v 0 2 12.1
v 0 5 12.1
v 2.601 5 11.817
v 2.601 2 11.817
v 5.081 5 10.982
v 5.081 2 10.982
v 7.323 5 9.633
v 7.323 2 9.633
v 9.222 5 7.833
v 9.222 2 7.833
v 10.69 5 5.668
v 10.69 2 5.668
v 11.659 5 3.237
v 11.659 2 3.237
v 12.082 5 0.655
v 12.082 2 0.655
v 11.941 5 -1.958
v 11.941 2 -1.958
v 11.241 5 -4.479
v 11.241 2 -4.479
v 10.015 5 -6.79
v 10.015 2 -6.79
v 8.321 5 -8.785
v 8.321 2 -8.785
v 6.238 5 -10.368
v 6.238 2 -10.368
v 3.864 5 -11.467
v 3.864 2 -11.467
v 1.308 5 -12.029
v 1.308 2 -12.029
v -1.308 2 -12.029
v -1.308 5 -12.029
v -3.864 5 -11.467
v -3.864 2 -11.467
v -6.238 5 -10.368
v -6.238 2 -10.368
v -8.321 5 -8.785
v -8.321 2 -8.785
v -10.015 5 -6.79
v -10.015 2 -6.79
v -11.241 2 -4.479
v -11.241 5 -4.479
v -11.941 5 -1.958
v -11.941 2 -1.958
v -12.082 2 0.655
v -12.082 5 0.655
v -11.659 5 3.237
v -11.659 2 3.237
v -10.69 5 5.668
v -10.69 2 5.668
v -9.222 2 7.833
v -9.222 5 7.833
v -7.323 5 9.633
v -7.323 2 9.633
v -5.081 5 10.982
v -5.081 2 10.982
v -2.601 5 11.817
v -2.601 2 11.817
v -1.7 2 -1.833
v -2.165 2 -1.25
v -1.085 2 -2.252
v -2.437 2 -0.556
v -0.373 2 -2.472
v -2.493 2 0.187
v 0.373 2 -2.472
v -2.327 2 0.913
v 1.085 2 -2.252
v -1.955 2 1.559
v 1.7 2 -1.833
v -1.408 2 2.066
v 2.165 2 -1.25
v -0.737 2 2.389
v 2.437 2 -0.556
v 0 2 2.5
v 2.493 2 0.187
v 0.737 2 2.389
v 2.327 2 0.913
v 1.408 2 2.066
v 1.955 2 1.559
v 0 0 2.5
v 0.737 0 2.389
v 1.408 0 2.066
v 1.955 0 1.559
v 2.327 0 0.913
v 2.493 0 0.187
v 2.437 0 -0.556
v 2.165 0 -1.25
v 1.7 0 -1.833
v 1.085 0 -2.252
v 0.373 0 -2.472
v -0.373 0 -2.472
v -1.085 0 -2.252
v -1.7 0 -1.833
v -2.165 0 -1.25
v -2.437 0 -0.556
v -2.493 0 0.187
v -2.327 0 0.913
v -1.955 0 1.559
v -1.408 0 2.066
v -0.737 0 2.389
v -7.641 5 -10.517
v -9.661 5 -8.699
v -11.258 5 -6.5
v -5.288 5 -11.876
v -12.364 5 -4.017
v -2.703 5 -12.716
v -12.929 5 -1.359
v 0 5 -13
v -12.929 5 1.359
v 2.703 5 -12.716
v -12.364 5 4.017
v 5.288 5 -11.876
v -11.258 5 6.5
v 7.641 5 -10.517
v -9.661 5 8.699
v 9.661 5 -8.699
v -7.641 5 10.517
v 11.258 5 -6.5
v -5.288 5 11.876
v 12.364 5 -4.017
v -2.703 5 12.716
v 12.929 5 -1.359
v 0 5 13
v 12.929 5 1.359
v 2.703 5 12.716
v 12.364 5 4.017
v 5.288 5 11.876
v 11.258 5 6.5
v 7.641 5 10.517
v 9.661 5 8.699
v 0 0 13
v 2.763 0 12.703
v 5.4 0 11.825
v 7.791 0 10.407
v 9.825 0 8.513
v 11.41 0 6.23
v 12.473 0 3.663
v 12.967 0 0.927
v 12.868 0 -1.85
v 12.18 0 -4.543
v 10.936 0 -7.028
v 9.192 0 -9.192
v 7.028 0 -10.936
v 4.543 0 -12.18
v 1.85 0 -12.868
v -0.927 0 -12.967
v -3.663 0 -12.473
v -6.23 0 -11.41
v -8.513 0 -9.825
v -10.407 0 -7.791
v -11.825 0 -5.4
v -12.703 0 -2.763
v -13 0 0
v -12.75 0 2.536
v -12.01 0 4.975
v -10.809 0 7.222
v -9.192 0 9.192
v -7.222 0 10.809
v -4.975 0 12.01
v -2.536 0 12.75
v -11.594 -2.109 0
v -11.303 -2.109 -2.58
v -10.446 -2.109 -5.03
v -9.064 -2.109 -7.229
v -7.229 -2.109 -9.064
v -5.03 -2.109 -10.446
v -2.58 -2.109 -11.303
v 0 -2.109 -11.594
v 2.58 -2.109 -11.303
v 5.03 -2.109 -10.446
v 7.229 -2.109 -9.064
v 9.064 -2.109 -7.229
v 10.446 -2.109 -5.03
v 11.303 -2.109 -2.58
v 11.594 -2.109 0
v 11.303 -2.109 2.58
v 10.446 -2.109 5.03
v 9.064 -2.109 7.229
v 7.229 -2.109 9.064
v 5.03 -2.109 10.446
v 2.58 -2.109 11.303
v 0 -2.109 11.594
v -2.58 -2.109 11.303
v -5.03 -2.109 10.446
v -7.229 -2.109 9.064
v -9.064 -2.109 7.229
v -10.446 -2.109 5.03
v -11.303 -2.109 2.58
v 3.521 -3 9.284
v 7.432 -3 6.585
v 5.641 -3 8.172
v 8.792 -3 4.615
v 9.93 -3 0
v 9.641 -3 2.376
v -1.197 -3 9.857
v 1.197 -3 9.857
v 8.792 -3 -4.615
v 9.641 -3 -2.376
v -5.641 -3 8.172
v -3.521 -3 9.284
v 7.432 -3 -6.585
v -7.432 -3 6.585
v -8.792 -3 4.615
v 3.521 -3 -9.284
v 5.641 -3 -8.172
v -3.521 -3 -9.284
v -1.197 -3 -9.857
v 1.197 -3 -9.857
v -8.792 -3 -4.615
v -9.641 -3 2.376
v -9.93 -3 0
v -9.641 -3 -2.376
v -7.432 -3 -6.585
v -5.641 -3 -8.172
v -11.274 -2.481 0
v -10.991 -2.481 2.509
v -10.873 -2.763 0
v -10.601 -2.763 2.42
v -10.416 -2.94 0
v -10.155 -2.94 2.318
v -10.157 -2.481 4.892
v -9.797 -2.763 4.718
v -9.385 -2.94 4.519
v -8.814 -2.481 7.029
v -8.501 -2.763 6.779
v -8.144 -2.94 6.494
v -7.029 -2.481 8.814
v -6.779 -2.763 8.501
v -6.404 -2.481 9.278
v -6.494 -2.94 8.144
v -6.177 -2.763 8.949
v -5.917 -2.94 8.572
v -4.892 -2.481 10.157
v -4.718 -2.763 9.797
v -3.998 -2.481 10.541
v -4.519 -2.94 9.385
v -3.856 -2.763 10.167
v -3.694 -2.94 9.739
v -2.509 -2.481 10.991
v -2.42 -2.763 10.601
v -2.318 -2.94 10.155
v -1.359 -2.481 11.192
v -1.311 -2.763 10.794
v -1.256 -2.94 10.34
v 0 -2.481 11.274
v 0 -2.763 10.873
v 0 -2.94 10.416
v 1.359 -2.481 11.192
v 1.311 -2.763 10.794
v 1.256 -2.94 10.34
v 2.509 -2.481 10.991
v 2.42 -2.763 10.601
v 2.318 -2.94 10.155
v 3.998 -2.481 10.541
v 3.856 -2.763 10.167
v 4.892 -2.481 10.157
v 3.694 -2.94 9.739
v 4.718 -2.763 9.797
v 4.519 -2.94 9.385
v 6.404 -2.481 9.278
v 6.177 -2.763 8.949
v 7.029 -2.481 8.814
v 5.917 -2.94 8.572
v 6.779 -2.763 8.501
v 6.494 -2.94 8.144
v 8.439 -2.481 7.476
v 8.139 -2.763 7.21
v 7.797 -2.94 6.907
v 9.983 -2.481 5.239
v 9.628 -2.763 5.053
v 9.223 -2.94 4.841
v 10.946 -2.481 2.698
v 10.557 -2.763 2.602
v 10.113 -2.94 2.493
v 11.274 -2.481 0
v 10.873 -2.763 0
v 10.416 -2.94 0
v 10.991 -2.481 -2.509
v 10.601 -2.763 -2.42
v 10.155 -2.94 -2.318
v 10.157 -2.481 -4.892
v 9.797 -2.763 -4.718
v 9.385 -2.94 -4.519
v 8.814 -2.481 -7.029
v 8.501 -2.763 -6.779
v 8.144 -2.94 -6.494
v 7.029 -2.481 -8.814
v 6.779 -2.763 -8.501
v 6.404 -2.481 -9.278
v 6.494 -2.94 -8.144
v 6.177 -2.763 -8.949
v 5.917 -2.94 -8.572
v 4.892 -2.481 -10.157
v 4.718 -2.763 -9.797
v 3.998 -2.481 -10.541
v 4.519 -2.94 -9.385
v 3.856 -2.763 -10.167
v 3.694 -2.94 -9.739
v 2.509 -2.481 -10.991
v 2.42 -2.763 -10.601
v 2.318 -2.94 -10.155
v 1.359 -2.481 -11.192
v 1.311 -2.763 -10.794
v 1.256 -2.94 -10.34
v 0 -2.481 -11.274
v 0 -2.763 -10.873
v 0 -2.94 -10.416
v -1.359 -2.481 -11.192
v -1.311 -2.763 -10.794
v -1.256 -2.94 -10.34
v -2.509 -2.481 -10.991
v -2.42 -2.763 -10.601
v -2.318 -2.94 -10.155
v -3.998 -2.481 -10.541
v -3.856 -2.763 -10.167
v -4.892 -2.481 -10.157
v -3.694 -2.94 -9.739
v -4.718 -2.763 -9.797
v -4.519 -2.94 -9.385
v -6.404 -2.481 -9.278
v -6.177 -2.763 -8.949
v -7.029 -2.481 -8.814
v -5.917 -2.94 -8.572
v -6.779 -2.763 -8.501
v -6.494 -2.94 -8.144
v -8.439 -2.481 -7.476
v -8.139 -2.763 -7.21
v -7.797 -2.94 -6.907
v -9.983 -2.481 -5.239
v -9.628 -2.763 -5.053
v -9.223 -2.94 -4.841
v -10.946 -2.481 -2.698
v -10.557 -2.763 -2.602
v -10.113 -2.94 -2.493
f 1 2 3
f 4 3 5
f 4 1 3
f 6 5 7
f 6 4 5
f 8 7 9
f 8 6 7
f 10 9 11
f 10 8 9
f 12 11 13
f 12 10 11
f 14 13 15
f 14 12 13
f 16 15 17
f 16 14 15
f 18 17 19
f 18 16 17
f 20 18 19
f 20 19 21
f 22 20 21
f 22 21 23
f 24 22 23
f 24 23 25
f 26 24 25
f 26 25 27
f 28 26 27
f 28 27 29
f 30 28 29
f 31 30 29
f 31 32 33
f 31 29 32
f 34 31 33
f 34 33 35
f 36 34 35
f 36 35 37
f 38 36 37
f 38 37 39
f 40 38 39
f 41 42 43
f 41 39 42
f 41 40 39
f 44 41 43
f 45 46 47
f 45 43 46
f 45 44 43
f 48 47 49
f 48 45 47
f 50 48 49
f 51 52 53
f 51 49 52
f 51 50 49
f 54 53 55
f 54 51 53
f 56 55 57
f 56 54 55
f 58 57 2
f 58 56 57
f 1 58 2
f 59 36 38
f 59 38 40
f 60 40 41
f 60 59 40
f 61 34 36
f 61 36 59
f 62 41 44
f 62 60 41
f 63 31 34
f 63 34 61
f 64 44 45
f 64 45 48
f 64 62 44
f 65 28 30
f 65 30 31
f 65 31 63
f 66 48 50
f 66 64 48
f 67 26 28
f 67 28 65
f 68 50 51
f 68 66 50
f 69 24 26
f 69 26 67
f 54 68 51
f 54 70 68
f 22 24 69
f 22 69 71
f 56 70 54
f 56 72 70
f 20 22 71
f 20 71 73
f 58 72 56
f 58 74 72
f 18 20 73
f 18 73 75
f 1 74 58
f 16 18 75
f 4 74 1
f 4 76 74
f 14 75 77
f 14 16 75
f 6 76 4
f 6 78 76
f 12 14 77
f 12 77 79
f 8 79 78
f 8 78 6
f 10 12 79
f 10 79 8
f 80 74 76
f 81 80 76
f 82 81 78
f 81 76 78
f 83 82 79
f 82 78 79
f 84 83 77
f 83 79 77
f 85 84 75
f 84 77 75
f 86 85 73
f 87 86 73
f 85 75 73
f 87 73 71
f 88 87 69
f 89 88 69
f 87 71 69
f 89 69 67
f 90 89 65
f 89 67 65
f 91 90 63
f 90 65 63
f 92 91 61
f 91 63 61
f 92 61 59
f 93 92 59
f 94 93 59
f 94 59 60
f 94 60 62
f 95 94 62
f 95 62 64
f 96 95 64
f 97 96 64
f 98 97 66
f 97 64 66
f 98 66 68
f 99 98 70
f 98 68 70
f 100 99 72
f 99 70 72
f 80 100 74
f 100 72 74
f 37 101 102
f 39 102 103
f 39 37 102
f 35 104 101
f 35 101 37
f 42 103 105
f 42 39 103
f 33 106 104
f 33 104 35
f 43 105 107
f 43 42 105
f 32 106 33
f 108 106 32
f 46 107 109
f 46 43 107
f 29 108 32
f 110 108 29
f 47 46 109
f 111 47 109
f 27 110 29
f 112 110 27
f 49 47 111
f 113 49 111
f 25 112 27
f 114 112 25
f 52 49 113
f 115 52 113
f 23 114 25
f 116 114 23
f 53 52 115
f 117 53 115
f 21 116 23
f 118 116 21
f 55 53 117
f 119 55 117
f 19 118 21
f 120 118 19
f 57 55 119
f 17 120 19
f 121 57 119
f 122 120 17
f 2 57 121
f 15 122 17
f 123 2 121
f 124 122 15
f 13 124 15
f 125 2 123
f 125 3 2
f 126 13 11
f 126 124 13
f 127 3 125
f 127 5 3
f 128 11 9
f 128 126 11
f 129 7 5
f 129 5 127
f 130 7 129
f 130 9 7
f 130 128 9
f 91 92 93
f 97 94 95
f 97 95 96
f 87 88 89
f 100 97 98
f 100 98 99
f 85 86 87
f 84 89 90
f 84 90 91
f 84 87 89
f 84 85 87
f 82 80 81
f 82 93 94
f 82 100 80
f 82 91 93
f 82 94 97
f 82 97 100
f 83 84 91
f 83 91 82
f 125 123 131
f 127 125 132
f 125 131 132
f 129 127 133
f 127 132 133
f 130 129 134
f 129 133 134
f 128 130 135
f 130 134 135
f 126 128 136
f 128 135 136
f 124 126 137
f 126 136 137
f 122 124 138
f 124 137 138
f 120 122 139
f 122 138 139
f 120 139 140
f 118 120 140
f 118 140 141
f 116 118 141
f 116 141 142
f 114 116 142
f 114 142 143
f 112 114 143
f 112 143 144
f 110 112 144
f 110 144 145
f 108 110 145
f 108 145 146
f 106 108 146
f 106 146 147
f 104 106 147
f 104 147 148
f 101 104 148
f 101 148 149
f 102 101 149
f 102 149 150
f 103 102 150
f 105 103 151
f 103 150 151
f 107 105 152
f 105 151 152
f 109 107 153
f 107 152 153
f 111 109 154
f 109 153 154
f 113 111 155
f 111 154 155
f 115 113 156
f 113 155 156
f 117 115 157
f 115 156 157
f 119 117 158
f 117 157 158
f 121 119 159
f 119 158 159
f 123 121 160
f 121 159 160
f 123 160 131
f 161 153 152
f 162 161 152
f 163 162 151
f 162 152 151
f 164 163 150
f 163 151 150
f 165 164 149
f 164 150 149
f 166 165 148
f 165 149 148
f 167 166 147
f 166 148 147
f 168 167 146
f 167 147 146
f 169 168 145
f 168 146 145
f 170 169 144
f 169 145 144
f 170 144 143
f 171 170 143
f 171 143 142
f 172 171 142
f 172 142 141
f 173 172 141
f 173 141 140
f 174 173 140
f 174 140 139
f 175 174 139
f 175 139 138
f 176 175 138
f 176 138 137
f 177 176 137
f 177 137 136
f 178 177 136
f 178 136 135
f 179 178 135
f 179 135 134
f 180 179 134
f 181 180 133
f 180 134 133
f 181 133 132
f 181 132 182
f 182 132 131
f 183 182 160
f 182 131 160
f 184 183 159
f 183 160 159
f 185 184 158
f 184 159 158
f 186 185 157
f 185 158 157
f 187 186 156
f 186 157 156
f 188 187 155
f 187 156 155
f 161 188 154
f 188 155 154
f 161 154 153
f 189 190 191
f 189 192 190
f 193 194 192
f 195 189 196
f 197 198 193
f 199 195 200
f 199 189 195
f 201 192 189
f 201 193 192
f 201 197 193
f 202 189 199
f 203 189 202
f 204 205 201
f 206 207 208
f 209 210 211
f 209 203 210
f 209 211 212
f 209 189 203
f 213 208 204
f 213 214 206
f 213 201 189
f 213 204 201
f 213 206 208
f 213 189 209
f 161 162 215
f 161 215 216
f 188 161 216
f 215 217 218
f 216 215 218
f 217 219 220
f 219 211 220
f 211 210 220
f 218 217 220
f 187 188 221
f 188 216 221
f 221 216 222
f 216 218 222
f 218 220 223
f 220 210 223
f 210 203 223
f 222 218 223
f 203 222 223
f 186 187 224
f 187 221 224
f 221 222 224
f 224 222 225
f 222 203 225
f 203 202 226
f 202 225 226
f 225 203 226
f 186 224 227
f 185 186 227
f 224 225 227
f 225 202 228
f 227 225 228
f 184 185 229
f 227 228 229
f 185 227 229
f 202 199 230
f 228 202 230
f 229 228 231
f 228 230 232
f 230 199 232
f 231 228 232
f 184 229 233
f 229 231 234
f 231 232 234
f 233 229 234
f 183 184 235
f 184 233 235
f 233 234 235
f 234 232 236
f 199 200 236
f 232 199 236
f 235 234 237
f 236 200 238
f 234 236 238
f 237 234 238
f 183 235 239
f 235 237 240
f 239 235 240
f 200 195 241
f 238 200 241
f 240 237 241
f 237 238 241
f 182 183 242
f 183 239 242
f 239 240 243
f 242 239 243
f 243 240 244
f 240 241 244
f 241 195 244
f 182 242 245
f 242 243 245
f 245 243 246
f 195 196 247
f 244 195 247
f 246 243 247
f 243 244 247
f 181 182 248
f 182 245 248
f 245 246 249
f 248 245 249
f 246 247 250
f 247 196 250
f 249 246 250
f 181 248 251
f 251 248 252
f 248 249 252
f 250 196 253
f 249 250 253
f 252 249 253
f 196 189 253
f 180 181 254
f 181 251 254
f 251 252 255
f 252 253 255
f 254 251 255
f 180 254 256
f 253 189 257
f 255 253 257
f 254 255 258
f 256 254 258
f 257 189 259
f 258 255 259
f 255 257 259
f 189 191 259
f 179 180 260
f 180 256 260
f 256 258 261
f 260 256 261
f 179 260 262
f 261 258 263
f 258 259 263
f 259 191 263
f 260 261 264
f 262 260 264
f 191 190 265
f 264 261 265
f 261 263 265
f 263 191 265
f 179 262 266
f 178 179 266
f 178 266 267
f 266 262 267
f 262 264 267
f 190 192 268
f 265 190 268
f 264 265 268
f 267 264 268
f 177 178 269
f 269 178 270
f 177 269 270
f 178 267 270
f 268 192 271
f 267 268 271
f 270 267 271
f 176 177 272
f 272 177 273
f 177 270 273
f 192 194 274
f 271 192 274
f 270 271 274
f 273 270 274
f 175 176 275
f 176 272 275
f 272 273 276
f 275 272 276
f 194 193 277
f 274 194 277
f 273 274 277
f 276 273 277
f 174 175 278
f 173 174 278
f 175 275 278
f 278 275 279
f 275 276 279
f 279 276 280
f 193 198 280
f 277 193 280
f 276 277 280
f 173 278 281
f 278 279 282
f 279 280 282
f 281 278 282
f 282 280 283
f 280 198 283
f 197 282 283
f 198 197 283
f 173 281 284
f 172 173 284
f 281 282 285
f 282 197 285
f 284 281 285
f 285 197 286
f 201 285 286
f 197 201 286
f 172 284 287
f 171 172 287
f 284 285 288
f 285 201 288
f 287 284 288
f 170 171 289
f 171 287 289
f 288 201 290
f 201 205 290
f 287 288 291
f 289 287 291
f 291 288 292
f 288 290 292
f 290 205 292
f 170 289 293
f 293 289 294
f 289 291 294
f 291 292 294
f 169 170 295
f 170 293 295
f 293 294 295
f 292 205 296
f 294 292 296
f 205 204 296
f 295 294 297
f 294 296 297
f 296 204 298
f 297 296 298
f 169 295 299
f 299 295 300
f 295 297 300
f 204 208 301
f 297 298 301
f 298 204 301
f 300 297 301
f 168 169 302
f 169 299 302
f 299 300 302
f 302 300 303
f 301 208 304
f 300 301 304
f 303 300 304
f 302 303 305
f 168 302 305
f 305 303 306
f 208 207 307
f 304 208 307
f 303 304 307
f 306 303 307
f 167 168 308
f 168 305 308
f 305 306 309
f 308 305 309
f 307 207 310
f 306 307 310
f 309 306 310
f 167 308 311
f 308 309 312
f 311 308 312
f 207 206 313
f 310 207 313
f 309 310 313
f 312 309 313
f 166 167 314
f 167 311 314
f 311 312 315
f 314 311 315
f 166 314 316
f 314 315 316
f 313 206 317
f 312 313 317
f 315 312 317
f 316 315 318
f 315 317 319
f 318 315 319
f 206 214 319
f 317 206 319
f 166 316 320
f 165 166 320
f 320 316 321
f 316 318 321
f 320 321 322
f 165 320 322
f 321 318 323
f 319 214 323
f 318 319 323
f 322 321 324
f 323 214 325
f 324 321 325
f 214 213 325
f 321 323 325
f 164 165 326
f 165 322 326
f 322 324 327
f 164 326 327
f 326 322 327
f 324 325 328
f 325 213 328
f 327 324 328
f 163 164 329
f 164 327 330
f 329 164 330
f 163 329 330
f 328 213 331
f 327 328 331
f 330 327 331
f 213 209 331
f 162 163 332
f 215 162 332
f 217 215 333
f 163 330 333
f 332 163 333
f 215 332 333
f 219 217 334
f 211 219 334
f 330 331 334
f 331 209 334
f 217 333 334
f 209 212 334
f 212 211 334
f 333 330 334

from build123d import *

# Parameters (mm, degrees)
SKETCH_1_R          = 13
EXTRUDE_1_DEPTH     = 5
SKETCH_2_R          = 12
CUT_EXTRUDE_1_DEPTH = 3
SKETCH_3_R          = 2.5
CUT_EXTRUDE_2_DEPTH = 2
SKETCH_4_R          = 11
FILLET_1_R          = 2
SKETCH_7_R          = 12.1
CUT_EXTRUDE_3_DEPTH = 20.05255902


with BuildPart() as part:
    # 草图1 → 凸台-拉伸1 (new body)
    with BuildSketch(Plane(origin=(0, 0, 0), x_dir=(1, 0, 0), z_dir=(0, 1, 0))):
        with Locations(Location((0, 0, 0), (0, 0, 270))):
            Circle(SKETCH_1_R)
    extrude(amount=EXTRUDE_1_DEPTH)

    # 草图2 → 切除-拉伸1 (cut)
    with BuildSketch(Plane(origin=(0, 5, 0), x_dir=(1, 0, 0), z_dir=(0, 1, 0))):
        with Locations(Location((0, 0, 0), (0, 0, 270))):
            Circle(SKETCH_2_R)
    extrude(amount=-CUT_EXTRUDE_1_DEPTH, mode=Mode.SUBTRACT)

    # 草图3 → 切除-拉伸2 (cut)
    with BuildSketch(Plane(origin=(0, 2, 0), x_dir=(1, 0, 0), z_dir=(0, 1, 0))):
        with Locations(Location((0, 0, 0), (0, 0, 270))):
            Circle(SKETCH_3_R)
    extrude(amount=-CUT_EXTRUDE_2_DEPTH, mode=Mode.SUBTRACT)

    # 草图4 → section 0 of loft_1
    with BuildSketch(Plane(origin=(0, -3, 0), x_dir=(-1, 0, 0), z_dir=(0, -1, 0)), mode=Mode.PRIVATE) as loft_1_s0:
        Circle(SKETCH_4_R)
    # loft up to a face of the part (loft_1)
    loft([loft_1_s0.sketch, Face(Wire([part.edges().sort_by_distance((-9.476592156, 0, -8.899112377))[0]]))])

    # 圆角1
    fillet_1_edges = [part.edges().sort_by_distance(p)[0] for p in [
        (11, -3, 0),
    ]]
    fillet(fillet_1_edges, radius=FILLET_1_R)

    # 草图7 → 切除-拉伸3 (cut, through all)
    with BuildSketch(Plane(origin=(0, 2, 0), x_dir=(1, 0, 0), z_dir=(0, 1, 0))):
        with Locations(Location((0, 0, 0), (0, 0, 270))):
            Circle(SKETCH_7_R)
    extrude(amount=CUT_EXTRUDE_3_DEPTH, mode=Mode.SUBTRACT)


solid = part.part
